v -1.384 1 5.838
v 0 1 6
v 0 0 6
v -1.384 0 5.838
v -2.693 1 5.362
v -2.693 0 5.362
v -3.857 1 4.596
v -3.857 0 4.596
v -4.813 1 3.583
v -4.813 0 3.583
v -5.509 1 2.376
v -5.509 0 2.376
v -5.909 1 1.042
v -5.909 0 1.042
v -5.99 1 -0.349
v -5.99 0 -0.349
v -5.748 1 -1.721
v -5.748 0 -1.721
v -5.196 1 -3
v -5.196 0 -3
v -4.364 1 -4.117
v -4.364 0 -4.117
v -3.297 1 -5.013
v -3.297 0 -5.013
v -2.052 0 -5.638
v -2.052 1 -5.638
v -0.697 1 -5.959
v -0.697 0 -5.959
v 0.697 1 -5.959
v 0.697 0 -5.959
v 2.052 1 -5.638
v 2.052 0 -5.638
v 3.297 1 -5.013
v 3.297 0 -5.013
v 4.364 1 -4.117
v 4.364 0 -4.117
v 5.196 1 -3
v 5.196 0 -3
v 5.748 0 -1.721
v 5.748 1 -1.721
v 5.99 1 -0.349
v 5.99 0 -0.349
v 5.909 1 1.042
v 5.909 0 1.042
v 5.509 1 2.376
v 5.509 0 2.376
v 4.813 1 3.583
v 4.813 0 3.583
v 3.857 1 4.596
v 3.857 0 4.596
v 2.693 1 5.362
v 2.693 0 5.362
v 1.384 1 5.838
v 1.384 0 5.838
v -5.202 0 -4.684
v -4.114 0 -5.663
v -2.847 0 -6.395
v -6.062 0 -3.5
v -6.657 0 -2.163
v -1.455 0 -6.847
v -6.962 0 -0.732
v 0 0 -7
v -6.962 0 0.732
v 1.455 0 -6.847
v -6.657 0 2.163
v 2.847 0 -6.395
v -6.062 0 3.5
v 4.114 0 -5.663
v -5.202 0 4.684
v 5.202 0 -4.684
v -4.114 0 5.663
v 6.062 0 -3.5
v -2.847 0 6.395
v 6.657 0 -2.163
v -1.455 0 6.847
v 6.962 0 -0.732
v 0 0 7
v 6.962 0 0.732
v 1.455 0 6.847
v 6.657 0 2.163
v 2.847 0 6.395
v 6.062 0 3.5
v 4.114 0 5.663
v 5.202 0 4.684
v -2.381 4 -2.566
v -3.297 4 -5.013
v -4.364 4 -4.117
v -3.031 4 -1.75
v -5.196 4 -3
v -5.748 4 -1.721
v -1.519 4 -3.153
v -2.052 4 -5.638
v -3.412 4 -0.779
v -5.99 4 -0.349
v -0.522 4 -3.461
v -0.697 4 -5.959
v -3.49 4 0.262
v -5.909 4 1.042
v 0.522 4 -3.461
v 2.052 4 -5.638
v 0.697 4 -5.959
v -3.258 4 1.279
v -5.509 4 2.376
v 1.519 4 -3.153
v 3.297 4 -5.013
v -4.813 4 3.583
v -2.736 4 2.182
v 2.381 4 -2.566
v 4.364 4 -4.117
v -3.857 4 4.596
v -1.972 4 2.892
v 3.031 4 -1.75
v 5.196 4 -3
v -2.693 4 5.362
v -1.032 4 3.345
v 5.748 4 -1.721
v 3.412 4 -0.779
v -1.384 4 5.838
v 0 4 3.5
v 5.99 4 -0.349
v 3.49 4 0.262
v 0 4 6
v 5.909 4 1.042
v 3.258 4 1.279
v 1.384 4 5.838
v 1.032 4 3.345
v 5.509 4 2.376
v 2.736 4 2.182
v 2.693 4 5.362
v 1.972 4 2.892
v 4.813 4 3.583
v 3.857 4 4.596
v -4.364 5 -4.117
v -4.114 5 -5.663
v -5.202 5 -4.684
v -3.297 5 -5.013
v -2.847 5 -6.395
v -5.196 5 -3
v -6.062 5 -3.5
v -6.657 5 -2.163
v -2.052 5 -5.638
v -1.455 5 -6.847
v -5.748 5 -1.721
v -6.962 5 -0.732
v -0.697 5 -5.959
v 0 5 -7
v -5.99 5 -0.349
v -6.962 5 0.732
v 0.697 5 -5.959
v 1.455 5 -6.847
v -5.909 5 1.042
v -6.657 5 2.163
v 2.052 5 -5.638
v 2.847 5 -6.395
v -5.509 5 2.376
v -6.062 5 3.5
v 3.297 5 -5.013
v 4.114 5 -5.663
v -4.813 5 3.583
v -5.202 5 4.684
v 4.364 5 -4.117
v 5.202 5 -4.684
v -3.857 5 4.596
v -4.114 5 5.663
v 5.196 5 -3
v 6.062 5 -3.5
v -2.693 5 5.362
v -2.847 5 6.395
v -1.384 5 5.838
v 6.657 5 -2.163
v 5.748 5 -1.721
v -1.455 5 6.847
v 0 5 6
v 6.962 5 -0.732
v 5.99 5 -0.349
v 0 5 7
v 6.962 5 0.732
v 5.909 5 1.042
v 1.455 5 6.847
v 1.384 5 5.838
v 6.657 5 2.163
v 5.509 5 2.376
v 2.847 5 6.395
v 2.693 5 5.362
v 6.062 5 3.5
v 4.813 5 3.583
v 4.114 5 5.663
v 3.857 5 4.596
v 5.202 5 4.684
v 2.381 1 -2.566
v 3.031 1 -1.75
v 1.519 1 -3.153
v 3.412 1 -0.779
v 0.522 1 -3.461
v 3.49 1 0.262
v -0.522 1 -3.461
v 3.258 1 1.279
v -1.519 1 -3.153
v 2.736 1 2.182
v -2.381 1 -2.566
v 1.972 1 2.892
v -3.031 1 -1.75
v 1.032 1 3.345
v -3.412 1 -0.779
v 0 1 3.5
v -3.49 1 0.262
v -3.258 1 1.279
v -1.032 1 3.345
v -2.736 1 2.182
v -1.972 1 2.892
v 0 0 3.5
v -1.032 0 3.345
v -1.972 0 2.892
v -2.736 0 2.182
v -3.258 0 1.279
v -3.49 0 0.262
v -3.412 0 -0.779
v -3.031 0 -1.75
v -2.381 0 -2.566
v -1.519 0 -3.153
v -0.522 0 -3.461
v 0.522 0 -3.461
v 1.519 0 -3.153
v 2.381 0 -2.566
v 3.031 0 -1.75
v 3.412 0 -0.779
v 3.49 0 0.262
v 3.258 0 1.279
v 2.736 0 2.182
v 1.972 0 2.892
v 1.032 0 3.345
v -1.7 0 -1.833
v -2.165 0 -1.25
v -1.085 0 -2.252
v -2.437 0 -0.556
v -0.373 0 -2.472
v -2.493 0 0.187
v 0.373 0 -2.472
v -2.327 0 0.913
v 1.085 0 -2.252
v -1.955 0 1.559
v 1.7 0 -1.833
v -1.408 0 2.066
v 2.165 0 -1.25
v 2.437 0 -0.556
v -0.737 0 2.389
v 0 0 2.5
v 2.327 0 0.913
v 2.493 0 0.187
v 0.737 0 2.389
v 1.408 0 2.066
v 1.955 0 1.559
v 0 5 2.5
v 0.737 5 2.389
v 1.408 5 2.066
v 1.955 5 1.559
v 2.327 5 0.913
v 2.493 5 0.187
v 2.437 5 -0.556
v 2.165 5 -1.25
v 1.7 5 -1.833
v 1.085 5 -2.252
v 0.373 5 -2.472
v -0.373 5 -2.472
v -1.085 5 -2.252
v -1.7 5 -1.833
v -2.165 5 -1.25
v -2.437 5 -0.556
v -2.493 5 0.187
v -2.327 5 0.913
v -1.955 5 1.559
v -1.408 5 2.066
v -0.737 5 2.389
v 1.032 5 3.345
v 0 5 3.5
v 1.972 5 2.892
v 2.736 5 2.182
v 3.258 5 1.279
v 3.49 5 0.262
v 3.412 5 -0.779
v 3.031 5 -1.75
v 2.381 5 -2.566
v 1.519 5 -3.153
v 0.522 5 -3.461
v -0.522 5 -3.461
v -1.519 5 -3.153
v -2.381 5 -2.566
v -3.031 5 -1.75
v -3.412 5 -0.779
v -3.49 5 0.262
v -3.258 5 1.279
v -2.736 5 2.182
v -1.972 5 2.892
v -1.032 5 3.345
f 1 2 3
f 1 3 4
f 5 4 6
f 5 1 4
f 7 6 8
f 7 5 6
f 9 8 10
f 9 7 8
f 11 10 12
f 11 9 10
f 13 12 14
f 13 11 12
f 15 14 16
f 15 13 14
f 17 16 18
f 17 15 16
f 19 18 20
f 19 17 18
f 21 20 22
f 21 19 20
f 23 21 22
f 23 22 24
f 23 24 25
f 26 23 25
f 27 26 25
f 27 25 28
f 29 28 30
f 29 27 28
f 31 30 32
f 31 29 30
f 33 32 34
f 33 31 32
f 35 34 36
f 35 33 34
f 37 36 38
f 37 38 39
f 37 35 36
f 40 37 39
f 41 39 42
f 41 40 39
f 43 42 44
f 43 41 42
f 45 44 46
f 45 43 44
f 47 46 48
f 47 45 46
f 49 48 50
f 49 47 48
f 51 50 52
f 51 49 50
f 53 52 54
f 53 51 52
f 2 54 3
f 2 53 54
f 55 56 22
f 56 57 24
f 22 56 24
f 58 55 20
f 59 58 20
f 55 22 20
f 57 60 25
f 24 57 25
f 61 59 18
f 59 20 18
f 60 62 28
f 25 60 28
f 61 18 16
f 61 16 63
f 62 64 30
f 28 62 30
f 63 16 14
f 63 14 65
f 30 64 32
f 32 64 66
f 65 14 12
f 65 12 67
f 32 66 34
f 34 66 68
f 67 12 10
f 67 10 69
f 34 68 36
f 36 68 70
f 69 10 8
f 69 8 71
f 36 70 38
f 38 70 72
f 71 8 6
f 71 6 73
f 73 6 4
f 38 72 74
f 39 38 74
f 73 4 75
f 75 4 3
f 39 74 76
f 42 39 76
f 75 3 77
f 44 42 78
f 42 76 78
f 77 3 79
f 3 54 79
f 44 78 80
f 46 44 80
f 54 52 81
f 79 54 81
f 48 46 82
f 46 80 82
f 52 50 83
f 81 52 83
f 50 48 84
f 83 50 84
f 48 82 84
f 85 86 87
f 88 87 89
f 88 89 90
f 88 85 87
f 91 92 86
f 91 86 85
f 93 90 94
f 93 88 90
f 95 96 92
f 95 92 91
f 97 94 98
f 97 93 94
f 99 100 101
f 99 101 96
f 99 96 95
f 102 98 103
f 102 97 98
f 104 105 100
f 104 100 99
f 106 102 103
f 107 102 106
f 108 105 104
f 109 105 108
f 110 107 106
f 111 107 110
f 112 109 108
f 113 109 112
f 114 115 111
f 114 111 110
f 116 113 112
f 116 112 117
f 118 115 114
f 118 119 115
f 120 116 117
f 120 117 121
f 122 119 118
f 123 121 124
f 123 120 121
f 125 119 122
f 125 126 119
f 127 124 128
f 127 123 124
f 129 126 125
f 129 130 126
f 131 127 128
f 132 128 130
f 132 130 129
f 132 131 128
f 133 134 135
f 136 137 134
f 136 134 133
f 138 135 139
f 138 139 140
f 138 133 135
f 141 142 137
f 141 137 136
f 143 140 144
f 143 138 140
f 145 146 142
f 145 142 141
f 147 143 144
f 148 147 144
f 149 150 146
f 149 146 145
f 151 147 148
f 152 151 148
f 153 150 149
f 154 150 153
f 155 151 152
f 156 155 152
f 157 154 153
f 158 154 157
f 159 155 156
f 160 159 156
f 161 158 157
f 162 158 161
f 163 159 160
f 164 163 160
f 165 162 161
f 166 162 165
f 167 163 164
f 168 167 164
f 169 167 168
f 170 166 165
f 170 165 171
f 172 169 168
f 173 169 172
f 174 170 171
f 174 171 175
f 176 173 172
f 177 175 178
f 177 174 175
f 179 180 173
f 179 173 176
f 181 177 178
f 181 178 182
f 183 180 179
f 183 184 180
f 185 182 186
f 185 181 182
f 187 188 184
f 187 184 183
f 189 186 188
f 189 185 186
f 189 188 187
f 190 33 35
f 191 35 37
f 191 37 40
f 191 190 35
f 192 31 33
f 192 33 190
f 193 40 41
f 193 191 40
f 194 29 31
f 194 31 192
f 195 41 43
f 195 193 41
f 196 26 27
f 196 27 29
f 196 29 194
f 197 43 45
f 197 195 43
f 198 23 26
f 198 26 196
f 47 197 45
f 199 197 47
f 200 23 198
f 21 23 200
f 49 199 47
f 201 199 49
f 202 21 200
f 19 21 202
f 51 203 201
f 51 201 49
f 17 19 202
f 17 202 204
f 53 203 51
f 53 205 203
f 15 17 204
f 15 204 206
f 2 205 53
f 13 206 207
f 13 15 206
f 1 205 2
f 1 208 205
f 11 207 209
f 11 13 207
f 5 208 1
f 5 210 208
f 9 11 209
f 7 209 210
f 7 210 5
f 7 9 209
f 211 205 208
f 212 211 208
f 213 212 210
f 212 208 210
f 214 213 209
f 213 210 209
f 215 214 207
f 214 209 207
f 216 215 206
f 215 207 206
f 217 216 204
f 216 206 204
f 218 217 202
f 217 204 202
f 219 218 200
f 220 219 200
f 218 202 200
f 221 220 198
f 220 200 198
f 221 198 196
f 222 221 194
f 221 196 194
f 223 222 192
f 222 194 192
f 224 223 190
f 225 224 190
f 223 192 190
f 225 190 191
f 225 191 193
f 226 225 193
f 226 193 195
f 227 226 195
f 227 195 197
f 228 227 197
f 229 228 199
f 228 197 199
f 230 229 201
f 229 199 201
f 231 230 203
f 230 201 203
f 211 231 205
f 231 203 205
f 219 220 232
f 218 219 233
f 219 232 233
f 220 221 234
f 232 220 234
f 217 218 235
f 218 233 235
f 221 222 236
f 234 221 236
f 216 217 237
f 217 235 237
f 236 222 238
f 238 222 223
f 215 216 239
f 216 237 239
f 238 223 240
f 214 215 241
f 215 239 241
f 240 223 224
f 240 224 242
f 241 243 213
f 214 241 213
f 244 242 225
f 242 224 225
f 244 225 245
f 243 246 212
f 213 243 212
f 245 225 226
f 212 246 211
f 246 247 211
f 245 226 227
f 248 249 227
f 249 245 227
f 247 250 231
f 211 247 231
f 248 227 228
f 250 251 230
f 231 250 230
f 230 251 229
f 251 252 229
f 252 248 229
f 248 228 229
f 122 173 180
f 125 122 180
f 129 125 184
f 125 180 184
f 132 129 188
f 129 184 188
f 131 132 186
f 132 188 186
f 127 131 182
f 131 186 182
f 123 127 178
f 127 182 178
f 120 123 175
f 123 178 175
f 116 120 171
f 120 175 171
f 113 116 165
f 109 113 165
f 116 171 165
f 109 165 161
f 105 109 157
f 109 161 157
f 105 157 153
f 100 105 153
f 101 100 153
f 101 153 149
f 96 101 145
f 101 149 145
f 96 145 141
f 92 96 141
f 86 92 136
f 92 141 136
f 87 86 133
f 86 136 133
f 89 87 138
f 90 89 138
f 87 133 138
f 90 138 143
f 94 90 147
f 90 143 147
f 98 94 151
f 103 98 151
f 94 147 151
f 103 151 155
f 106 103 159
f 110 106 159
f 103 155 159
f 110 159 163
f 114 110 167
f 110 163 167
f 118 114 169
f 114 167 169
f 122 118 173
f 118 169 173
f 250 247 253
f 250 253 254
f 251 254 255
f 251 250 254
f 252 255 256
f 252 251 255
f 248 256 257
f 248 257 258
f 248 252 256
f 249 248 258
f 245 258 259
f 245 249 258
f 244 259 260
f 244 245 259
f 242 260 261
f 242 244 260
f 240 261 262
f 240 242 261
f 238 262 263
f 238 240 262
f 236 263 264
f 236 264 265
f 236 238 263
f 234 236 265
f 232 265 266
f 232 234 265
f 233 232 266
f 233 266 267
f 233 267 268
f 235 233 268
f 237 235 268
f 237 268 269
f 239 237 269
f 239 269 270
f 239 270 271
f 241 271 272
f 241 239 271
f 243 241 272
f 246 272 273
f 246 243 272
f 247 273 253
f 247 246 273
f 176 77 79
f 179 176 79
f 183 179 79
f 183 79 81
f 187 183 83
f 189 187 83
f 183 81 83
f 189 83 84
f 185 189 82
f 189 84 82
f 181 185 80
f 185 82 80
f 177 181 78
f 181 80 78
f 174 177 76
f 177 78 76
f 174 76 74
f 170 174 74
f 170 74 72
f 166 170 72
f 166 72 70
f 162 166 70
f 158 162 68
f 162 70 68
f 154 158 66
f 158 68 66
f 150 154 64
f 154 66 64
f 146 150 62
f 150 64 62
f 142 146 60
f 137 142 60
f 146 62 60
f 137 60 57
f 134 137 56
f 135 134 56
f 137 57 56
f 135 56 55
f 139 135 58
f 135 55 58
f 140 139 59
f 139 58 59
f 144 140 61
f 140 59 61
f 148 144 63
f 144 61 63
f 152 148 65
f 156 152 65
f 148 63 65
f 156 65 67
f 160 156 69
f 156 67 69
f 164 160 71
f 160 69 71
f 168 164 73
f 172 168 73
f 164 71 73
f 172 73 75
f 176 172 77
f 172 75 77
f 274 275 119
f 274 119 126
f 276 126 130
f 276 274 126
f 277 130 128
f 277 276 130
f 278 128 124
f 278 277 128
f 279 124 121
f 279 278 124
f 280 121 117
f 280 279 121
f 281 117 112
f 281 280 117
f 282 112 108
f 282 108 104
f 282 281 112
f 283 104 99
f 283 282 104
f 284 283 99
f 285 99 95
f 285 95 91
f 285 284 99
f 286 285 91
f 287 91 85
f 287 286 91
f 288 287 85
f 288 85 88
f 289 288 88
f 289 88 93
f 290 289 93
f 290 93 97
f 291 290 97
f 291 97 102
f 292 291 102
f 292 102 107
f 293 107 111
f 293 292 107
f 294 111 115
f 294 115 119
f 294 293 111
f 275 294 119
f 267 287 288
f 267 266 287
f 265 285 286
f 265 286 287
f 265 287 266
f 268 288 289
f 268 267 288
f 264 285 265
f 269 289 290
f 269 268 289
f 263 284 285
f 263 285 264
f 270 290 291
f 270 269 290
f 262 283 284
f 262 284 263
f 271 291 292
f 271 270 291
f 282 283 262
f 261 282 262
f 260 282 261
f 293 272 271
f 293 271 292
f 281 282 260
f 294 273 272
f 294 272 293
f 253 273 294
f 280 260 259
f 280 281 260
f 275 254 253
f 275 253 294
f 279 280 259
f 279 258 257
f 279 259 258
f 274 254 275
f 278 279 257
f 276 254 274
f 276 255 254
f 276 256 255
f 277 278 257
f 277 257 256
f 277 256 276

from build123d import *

# Parameters (mm, degrees)
SKETCH_1_R          = 7
SKETCH_1_R_2        = 2.5
EXTRUDE_1_DEPTH     = 5
SKETCH_2_R          = 6
SKETCH_2_R_2        = 3.5
CUT_EXTRUDE_1_DEPTH = 1
CUT_EXTRUDE_START   = -1
SKETCH_3_R          = 6
SKETCH_3_R_2        = 3.5
CUT_EXTRUDE_2_DEPTH = 1


with BuildPart() as part:
    # 스케치1 → 보스-돌출1 (new body)
    with BuildSketch(Plane(origin=(0, 0, 0), x_dir=(1, 0, 0), z_dir=(0, 1, 0))):
        with Locations(Location((0, 0, 0), (0, 0, 270))):
            Circle(SKETCH_1_R)
        with Locations(Location((0, 0, 0), (0, 0, 270))):
            Circle(SKETCH_1_R_2, mode=Mode.SUBTRACT)
    extrude(amount=EXTRUDE_1_DEPTH)

    # 스케치2 → 컷-돌출1 (cut)
    with BuildSketch(Plane(origin=(0, 5, 0), x_dir=(1, 0, 0), z_dir=(0, 1, 0))):
        with Locations(Location((0, 0, 0), (0, 0, 270))):
            Circle(SKETCH_2_R)
        with Locations(Location((0, 0, 0), (0, 0, 270))):
            Circle(SKETCH_2_R_2, mode=Mode.SUBTRACT)
    extrude(amount=-CUT_EXTRUDE_1_DEPTH, mode=Mode.SUBTRACT)

    # 스케치3 → 컷-돌출2 (cut)
    with BuildSketch(Plane(origin=(0, 0, 0), x_dir=(-1, 0, 0), z_dir=(0, -1, 0)).offset(CUT_EXTRUDE_START)):
        with Locations(Location((0, 0, 0), (0, 0, 270))):
            Circle(SKETCH_3_R)
        with Locations(Location((0, 0, 0), (0, 0, 270))):
            Circle(SKETCH_3_R_2, mode=Mode.SUBTRACT)
    extrude(amount=CUT_EXTRUDE_2_DEPTH, mode=Mode.SUBTRACT)


solid = part.part
